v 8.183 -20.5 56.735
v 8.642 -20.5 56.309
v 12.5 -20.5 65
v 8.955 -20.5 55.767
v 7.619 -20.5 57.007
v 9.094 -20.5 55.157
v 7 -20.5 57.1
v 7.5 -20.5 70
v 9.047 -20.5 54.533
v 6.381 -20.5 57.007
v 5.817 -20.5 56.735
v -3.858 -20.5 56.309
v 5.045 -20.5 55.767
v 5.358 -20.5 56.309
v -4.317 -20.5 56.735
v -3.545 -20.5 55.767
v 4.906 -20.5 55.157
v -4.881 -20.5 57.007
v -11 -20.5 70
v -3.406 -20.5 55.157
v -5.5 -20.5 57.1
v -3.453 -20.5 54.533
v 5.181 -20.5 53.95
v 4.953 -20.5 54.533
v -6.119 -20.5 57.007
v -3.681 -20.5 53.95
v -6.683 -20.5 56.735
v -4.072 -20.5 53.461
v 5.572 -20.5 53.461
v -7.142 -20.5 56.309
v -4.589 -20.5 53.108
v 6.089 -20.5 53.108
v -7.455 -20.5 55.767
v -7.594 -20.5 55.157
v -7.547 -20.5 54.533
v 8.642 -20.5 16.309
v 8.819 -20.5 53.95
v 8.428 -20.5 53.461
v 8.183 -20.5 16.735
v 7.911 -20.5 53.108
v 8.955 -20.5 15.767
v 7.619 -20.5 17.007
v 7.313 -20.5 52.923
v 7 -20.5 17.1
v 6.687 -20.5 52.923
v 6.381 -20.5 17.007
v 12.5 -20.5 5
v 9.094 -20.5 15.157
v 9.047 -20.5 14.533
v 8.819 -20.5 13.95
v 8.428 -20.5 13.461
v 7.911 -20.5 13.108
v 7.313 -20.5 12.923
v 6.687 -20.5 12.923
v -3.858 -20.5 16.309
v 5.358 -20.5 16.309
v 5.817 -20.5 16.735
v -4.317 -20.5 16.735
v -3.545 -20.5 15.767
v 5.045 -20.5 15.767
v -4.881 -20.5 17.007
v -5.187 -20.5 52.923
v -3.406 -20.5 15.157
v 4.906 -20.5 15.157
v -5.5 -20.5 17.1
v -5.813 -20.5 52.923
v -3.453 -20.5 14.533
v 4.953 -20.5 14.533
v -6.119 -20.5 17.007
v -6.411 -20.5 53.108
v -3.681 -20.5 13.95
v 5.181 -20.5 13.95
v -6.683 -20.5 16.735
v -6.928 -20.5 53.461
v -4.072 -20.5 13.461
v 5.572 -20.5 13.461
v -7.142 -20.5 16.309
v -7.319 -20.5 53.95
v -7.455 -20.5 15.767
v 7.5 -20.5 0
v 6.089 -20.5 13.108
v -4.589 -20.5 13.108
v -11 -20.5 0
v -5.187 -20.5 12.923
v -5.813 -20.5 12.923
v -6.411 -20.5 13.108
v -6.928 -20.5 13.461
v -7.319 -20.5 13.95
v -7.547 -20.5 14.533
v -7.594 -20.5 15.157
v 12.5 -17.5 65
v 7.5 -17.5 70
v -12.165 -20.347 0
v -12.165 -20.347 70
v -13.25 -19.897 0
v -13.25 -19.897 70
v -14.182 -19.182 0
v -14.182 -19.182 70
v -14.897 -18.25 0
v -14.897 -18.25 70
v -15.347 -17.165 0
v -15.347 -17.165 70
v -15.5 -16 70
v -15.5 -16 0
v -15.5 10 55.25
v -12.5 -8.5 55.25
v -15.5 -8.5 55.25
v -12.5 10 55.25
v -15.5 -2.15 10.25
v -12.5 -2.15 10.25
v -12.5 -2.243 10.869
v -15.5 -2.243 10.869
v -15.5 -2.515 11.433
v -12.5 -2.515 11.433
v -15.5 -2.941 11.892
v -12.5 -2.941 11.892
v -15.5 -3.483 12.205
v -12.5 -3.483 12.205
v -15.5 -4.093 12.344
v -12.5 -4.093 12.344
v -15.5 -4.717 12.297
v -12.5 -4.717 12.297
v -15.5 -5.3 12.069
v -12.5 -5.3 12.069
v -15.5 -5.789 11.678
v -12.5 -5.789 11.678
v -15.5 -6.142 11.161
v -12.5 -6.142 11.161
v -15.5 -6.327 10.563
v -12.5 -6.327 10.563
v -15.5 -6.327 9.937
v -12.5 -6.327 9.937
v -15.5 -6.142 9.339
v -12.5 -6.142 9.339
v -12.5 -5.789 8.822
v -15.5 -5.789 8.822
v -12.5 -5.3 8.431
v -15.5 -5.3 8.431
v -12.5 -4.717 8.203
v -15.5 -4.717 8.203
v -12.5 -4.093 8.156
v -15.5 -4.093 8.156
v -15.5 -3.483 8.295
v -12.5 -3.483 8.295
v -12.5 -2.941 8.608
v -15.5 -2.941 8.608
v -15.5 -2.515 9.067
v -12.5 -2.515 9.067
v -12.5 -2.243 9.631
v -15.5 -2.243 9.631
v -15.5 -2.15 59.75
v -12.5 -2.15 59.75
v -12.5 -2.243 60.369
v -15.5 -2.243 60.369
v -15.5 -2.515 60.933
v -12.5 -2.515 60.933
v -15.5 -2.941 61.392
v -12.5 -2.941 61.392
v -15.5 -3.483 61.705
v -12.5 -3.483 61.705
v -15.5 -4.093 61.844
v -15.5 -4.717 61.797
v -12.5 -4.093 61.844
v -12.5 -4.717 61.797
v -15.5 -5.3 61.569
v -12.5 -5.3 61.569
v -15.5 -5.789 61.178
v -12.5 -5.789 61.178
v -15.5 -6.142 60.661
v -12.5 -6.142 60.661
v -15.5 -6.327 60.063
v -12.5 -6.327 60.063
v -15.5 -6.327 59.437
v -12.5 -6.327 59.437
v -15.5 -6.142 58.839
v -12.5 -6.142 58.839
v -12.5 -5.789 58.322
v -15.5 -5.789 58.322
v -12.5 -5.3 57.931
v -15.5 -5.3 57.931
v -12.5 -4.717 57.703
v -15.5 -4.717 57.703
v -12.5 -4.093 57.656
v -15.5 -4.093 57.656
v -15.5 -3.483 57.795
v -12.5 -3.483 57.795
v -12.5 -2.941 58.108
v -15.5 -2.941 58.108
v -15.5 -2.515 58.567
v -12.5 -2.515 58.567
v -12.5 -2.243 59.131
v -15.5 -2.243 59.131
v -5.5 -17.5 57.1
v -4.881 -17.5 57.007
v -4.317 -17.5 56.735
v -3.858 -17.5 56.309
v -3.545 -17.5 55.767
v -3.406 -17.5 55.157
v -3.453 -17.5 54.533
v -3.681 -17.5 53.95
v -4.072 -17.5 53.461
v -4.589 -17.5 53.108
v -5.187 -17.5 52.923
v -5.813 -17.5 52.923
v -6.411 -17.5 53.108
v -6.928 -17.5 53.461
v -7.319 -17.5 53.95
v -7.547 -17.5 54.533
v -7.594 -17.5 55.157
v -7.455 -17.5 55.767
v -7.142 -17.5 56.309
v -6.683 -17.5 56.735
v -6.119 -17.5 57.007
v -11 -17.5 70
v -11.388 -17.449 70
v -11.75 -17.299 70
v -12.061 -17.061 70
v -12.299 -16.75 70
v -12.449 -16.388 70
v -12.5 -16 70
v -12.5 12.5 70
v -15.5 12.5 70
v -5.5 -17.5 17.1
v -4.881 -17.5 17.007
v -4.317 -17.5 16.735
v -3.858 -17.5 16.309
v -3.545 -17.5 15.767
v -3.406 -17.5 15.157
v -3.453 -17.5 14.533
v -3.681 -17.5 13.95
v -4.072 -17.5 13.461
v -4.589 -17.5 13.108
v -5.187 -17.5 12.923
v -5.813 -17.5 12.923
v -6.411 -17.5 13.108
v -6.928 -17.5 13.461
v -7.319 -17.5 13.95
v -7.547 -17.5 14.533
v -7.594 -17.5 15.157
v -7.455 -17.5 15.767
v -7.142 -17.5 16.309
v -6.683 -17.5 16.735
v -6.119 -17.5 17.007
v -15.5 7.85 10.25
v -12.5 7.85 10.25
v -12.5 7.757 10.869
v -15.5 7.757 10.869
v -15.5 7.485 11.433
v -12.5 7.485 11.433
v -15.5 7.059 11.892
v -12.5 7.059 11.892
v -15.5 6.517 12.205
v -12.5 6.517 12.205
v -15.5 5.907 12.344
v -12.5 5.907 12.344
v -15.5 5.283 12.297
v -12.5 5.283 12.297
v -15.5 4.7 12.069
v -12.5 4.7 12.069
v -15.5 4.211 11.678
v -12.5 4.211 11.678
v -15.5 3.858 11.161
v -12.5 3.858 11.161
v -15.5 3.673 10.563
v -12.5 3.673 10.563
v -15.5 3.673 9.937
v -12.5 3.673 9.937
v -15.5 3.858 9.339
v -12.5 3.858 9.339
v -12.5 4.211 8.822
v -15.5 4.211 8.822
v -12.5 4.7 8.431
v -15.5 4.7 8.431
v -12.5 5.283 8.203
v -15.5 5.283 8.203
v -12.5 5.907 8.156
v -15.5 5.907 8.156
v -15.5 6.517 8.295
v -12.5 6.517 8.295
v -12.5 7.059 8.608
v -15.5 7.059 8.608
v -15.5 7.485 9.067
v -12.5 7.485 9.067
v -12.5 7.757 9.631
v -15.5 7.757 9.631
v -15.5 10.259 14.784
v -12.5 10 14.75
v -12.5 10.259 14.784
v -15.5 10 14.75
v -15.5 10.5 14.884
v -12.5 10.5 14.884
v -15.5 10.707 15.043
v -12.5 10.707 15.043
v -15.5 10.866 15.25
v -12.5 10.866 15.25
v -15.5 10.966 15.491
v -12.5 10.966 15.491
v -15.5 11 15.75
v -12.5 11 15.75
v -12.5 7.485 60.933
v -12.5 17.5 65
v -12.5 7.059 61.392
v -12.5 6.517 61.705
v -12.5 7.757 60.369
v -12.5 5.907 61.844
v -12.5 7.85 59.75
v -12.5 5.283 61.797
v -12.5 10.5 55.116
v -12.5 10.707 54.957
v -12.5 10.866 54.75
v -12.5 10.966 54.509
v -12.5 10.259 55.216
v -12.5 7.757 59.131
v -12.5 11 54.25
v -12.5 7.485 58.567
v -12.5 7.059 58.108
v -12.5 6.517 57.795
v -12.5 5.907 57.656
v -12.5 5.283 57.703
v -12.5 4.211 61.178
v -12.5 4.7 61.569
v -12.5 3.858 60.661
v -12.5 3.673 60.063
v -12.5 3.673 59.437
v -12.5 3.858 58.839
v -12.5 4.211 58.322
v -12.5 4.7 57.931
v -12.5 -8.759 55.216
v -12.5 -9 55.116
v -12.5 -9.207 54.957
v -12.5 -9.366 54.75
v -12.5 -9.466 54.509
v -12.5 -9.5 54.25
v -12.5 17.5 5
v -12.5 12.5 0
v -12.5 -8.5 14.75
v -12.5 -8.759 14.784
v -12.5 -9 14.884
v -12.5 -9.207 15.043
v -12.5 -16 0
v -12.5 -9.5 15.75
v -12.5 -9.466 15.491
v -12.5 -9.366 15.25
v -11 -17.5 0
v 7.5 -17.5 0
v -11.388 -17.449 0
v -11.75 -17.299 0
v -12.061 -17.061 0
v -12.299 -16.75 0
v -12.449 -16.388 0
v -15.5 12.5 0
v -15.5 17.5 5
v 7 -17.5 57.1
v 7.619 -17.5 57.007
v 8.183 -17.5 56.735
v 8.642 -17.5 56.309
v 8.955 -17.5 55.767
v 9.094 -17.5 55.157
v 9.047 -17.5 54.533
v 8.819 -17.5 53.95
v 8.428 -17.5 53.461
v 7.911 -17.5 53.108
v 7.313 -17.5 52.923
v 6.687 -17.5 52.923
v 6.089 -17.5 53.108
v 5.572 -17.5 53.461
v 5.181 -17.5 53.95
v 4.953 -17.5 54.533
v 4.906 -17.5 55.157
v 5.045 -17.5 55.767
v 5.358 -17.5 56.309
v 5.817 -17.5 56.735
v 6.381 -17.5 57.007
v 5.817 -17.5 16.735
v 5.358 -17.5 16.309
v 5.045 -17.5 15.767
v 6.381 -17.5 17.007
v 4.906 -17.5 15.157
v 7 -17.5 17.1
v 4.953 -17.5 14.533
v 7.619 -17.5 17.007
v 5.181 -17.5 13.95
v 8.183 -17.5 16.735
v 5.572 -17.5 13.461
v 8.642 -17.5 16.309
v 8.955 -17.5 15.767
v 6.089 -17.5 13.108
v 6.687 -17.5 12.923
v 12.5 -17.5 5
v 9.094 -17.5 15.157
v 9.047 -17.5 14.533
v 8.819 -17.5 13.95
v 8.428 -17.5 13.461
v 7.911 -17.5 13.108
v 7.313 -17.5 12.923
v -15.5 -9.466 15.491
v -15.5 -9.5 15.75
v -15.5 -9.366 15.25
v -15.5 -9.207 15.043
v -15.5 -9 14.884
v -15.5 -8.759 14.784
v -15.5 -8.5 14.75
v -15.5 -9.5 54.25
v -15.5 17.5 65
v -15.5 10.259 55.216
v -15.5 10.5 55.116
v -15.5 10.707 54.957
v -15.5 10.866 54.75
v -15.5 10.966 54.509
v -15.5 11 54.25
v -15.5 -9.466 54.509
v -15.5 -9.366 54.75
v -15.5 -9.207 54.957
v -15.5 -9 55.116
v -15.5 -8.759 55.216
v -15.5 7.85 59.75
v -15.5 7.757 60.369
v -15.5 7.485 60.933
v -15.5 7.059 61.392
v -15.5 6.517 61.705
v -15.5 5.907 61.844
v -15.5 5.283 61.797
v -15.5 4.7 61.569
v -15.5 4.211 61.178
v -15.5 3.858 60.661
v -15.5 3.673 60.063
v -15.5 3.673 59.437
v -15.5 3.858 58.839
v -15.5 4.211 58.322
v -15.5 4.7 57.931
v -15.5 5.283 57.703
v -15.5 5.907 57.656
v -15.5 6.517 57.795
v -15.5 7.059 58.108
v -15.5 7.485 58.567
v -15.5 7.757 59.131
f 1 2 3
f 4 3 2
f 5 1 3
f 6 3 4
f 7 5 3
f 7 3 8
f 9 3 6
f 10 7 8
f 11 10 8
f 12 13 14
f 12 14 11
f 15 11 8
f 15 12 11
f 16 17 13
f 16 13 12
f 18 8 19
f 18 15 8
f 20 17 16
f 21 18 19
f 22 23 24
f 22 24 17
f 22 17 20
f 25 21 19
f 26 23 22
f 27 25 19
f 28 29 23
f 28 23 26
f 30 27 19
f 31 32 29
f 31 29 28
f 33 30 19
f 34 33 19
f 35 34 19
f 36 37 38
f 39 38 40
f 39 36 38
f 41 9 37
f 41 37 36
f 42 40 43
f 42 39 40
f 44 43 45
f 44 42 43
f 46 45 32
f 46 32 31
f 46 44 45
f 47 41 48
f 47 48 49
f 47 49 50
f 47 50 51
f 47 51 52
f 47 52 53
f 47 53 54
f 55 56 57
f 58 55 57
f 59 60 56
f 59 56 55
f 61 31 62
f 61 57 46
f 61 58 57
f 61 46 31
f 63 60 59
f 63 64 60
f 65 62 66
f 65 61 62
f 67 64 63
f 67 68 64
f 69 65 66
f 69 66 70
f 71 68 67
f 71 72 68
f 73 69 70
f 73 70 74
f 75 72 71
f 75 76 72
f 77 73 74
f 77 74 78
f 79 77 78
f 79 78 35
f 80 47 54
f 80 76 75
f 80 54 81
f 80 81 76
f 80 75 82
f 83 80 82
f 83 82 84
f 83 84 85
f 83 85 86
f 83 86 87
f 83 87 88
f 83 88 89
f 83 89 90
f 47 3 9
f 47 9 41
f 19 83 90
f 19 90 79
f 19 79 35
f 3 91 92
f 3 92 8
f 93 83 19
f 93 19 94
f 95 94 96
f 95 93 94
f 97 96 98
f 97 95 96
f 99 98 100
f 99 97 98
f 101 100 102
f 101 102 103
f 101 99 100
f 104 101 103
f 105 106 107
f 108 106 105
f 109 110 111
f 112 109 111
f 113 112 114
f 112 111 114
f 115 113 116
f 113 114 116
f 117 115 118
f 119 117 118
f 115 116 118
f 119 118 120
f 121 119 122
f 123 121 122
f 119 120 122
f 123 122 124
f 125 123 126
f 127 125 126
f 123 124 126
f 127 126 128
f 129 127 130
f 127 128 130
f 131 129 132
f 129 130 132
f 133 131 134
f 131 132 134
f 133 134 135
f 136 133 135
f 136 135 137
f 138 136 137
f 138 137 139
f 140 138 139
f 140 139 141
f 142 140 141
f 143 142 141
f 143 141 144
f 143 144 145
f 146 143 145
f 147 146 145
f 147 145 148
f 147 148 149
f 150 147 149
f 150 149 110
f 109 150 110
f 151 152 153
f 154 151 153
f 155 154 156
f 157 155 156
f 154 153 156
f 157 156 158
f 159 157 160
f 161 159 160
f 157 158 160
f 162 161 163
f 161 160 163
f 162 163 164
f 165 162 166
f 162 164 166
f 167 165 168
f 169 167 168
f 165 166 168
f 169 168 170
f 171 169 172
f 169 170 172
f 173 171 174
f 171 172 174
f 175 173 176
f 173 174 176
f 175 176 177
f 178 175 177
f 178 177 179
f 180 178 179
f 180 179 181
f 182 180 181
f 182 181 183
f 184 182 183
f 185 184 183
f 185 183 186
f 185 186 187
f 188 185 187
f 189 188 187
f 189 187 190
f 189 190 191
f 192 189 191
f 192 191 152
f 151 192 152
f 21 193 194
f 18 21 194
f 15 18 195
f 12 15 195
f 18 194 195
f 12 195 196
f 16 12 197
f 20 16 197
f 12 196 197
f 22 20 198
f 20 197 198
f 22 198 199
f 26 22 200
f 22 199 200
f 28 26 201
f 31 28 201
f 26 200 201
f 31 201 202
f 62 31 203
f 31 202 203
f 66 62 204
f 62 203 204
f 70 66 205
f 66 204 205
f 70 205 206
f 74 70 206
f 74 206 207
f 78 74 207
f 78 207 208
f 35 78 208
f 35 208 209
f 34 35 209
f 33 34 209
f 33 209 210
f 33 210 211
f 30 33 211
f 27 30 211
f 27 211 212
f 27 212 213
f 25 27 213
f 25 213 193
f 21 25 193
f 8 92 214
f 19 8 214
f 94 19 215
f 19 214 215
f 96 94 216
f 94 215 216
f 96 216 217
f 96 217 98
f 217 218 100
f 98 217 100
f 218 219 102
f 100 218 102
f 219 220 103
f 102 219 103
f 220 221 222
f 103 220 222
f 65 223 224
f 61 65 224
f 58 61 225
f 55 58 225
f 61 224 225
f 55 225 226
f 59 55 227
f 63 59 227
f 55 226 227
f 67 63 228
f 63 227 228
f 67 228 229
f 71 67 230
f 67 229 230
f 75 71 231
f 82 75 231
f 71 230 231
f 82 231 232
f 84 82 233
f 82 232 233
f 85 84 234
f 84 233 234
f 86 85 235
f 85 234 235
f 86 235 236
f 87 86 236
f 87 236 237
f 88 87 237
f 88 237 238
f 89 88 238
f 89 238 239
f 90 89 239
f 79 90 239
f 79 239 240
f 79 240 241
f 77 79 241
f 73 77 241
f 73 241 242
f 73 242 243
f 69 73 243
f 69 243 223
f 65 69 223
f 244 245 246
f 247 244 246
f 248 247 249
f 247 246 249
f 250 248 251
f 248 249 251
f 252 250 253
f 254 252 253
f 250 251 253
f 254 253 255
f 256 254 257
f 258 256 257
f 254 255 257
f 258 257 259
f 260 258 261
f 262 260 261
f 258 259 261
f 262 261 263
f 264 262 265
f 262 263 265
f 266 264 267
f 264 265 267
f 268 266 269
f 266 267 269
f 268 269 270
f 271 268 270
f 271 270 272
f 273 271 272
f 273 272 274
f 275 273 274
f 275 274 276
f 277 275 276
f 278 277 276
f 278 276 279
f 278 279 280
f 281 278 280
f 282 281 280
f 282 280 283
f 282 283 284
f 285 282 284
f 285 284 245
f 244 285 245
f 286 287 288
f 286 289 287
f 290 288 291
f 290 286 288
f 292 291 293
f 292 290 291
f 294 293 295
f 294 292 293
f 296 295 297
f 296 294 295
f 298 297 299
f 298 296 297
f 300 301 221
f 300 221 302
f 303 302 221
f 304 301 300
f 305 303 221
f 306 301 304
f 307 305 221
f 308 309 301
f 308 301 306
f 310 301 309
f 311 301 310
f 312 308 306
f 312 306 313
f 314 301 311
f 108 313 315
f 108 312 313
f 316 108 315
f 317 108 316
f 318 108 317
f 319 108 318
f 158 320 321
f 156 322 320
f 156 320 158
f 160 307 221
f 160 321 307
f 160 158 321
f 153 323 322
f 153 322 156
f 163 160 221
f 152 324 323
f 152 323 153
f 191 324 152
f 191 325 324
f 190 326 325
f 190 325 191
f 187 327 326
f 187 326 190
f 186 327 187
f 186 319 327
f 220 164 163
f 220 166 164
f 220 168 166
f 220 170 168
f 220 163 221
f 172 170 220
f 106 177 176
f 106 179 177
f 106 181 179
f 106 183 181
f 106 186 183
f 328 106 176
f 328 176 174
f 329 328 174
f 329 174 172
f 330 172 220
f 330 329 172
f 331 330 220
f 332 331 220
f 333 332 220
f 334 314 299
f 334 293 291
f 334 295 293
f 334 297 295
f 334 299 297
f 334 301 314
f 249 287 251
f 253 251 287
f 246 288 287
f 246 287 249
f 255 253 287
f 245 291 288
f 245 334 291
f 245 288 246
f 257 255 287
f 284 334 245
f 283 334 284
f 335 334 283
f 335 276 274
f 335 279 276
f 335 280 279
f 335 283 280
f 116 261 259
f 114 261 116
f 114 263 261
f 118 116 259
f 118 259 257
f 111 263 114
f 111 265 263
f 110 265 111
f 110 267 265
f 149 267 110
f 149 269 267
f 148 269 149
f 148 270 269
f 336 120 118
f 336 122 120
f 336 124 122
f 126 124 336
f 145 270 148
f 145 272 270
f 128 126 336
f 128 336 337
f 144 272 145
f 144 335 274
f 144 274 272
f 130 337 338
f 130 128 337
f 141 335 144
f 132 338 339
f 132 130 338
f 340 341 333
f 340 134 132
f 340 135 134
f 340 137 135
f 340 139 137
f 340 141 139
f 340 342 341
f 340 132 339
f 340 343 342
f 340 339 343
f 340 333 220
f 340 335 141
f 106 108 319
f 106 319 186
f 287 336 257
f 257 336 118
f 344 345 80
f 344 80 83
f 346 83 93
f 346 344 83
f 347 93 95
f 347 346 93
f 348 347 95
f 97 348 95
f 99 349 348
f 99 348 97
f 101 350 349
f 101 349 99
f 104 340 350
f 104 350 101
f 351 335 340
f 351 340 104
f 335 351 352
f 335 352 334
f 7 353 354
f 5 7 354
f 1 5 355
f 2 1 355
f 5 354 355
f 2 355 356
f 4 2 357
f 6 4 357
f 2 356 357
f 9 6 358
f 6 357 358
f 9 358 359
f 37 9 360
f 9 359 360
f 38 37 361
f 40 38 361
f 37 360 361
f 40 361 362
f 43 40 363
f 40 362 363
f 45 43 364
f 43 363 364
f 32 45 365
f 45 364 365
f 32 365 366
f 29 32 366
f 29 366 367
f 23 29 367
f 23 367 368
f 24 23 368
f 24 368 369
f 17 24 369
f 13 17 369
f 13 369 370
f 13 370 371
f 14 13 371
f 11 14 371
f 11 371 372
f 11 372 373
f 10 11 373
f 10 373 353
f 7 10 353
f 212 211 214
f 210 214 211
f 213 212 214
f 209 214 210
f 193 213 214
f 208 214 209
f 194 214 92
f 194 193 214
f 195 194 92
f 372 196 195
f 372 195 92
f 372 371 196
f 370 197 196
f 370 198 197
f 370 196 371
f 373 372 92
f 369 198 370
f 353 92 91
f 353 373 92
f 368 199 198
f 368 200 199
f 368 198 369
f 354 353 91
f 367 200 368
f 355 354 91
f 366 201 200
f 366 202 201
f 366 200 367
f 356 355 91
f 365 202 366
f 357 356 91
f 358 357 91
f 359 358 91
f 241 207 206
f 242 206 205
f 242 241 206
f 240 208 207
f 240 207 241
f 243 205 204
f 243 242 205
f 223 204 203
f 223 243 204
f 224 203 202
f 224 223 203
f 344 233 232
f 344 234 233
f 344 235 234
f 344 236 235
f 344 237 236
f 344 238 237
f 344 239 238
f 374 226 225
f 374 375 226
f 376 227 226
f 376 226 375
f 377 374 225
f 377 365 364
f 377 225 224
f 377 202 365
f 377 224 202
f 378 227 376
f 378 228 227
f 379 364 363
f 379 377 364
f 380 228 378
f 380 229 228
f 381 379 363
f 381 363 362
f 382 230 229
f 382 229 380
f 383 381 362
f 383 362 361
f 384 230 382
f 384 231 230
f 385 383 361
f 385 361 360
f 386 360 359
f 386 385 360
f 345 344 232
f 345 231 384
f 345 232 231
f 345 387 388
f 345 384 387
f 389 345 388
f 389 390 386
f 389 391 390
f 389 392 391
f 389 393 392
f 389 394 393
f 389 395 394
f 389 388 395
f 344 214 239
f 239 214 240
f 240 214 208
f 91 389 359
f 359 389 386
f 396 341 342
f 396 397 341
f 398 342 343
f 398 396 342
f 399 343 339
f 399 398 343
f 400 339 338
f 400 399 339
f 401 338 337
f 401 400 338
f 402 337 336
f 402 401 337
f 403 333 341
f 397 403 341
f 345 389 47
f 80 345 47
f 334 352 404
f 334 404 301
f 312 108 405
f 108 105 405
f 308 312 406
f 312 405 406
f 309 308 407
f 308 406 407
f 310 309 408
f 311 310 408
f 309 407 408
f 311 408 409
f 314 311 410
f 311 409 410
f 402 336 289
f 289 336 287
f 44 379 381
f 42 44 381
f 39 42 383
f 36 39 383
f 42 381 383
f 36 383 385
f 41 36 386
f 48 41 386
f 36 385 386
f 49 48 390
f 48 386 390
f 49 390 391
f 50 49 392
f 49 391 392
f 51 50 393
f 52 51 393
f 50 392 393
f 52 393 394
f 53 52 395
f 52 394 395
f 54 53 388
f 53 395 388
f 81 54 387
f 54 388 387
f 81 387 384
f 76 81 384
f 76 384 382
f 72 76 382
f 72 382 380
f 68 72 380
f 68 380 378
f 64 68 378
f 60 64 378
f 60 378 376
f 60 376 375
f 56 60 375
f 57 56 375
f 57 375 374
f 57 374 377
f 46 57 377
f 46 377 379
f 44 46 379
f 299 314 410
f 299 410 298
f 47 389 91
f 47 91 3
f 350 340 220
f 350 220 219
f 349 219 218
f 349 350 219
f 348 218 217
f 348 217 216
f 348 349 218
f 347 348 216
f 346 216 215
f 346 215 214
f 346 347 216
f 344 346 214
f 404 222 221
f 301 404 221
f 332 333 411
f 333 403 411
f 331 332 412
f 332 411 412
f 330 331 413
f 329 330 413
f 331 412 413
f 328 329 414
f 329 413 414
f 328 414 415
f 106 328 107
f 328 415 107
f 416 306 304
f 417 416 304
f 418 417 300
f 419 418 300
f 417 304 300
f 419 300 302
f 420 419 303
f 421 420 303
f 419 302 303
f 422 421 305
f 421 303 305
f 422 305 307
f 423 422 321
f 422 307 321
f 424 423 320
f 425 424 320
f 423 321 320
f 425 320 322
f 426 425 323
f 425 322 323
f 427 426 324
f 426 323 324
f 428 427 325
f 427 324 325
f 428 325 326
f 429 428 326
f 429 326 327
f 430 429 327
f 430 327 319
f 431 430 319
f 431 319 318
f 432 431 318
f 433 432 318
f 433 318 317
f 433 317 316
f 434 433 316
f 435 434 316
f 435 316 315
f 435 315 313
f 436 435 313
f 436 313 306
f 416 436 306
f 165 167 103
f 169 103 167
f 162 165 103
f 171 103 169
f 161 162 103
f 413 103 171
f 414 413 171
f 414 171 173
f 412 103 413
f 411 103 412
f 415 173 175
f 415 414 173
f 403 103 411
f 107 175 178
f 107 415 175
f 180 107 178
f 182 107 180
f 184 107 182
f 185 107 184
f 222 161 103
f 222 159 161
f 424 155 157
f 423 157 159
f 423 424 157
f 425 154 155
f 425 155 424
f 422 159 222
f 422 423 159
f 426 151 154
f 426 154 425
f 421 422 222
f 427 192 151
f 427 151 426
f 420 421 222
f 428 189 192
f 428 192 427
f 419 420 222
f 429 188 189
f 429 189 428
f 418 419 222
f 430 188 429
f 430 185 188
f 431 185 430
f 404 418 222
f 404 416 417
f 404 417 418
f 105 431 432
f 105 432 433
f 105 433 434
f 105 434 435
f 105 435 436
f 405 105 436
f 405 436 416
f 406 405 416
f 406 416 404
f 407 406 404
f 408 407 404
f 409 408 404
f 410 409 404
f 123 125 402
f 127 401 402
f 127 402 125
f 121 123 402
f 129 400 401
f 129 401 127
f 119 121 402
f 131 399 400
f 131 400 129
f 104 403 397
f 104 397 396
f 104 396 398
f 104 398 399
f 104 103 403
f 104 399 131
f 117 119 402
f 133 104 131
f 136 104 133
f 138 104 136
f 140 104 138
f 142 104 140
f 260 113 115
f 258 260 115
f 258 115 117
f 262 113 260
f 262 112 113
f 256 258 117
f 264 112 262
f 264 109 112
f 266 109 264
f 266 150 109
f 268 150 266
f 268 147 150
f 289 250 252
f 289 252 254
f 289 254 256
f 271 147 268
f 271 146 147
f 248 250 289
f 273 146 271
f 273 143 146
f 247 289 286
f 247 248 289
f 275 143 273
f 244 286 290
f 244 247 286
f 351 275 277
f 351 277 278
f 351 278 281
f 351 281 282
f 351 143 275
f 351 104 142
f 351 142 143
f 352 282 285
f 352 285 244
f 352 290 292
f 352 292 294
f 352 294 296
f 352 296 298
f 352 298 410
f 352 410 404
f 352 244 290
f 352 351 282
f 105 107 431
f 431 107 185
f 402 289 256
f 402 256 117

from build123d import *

# Parameters (mm, degrees)
SM_BASE_FLANGE_1_DEPTH = 70
CUT_EXTRUDE_7_REACH    = 79.105
SKETCH_18_W            = 40.5
SKETCH_18_H            = 20.5
CUT_EXTRUDE_8_REACH    = 79.105
SKETCH_19_R            = 2.1
FILLET_2_R             = 1
CUT_EXTRUDE_9_REACH    = 81.783
SKETCH_20_R            = 2.1
CHAMFER_3_SIZE         = 5


# Sheet-metal steps are written as plain solids
with BuildPart() as part:
    # Sketch 1 → 基材-凸緣1 (new body)
    with BuildSketch(Plane.XY):
        with BuildLine():
            Line((-12.5, 17.5), (-12.5, -16))
            ThreePointArc((-12.5, -16), (-12.060660172, -17.060660172), (-11, -17.5))
            Line((-11, -17.5), (12.5, -17.5))
            Line((12.5, -17.5), (12.5, -20.5))
            Line((12.5, -20.5), (-11, -20.5))
            ThreePointArc((-11, -20.5), (-14.181980515, -19.181980515), (-15.5, -16))
            Line((-15.5, -16), (-15.5, 17.5))
            Line((-15.5, 17.5), (-12.5, 17.5))
        make_face()
    extrude(amount=SM_BASE_FLANGE_1_DEPTH)

    # 草圖18 → 除料-伸長7 (cut, up to next)
    with BuildSketch(Plane(origin=(-12.5, 0, 0), x_dir=(0, 0, -1), z_dir=(1, 0, 0)), mode=Mode.PRIVATE) as cut_extrude_7_sk1:
        with Locations((-35, 0.75)):
            Rectangle(SKETCH_18_W, SKETCH_18_H)
    cut_extrude_7_tool1 = extrude(cut_extrude_7_sk1.sketch, amount=-CUT_EXTRUDE_7_REACH, mode=Mode.PRIVATE) & part.part
    add(cut_extrude_7_tool1.solids().sort_by_distance((-12.5, 0.75, 35))[0], mode=Mode.SUBTRACT)

    # 草圖19 → 除料-伸長8 (cut, up to next)
    with BuildSketch(Plane(origin=(-12.5, 0, 0), x_dir=(0, 0, -1), z_dir=(1, 0, 0)), mode=Mode.PRIVATE) as cut_extrude_8_sk1:
        with Locations(Location((-10.25, 5.75, 0), (0, 0, 90))):
            Circle(SKETCH_19_R)
    cut_extrude_8_tool1 = extrude(cut_extrude_8_sk1.sketch, amount=-CUT_EXTRUDE_8_REACH, mode=Mode.PRIVATE) & part.part
    # 草圖19 → 除料-伸長8 (cut, up to next)
    with BuildSketch(Plane(origin=(-12.5, 0, 0), x_dir=(0, 0, -1), z_dir=(1, 0, 0)), mode=Mode.PRIVATE) as cut_extrude_8_sk2:
        with Locations(Location((-10.25, -4.25, 0), (0, 0, 90))):
            Circle(SKETCH_19_R)
    cut_extrude_8_tool2 = extrude(cut_extrude_8_sk2.sketch, amount=-CUT_EXTRUDE_8_REACH, mode=Mode.PRIVATE) & part.part
    # 草圖19 → 除料-伸長8 (cut, up to next)
    with BuildSketch(Plane(origin=(-12.5, 0, 0), x_dir=(0, 0, -1), z_dir=(1, 0, 0)), mode=Mode.PRIVATE) as cut_extrude_8_sk3:
        with Locations(Location((-59.75, -4.25, 0), (0, 0, 90))):
            Circle(SKETCH_19_R)
    cut_extrude_8_tool3 = extrude(cut_extrude_8_sk3.sketch, amount=-CUT_EXTRUDE_8_REACH, mode=Mode.PRIVATE) & part.part
    # 草圖19 → 除料-伸長8 (cut, up to next)
    with BuildSketch(Plane(origin=(-12.5, 0, 0), x_dir=(0, 0, -1), z_dir=(1, 0, 0)), mode=Mode.PRIVATE) as cut_extrude_8_sk4:
        with Locations(Location((-59.75, 5.75, 0), (0, 0, 90))):
            Circle(SKETCH_19_R)
    cut_extrude_8_tool4 = extrude(cut_extrude_8_sk4.sketch, amount=-CUT_EXTRUDE_8_REACH, mode=Mode.PRIVATE) & part.part
    add(cut_extrude_8_tool1.solids().sort_by_distance((-12.5, 5.75, 10.25))[0], mode=Mode.SUBTRACT)
    add(cut_extrude_8_tool2.solids().sort_by_distance((-12.5, -4.25, 10.25))[0], mode=Mode.SUBTRACT)
    add(cut_extrude_8_tool3.solids().sort_by_distance((-12.5, -4.25, 59.75))[0], mode=Mode.SUBTRACT)
    add(cut_extrude_8_tool4.solids().sort_by_distance((-12.5, 5.75, 59.75))[0], mode=Mode.SUBTRACT)

    # 圓角2
    fillet_2_edges = [part.edges().sort_by_distance(p)[0] for p in [
        (-14, 11, 14.75),
        (-14, -9.5, 14.75),
        (-14, -9.5, 55.25),
        (-14, 11, 55.25),
    ]]
    fillet(fillet_2_edges, radius=FILLET_2_R)

    # 草圖20 → 除料-伸長9 (cut, up to next)
    with BuildSketch(Plane(origin=(0, -17.5, 0), x_dir=(1, 0, 0), z_dir=(0, 1, 0)), mode=Mode.PRIVATE) as cut_extrude_9_sk1:
        with Locations(Location((-5.5, -15, 0), (0, 0, 270))):
            Circle(SKETCH_20_R)
    cut_extrude_9_tool1 = extrude(cut_extrude_9_sk1.sketch, amount=-CUT_EXTRUDE_9_REACH, mode=Mode.PRIVATE) & part.part
    # 草圖20 → 除料-伸長9 (cut, up to next)
    with BuildSketch(Plane(origin=(0, -17.5, 0), x_dir=(1, 0, 0), z_dir=(0, 1, 0)), mode=Mode.PRIVATE) as cut_extrude_9_sk2:
        with Locations(Location((7, -15, 0), (0, 0, 270))):
            Circle(SKETCH_20_R)
    cut_extrude_9_tool2 = extrude(cut_extrude_9_sk2.sketch, amount=-CUT_EXTRUDE_9_REACH, mode=Mode.PRIVATE) & part.part
    # 草圖20 → 除料-伸長9 (cut, up to next)
    with BuildSketch(Plane(origin=(0, -17.5, 0), x_dir=(1, 0, 0), z_dir=(0, 1, 0)), mode=Mode.PRIVATE) as cut_extrude_9_sk3:
        with Locations(Location((7, -55, 0), (0, 0, 270))):
            Circle(SKETCH_20_R)
    cut_extrude_9_tool3 = extrude(cut_extrude_9_sk3.sketch, amount=-CUT_EXTRUDE_9_REACH, mode=Mode.PRIVATE) & part.part
    # 草圖20 → 除料-伸長9 (cut, up to next)
    with BuildSketch(Plane(origin=(0, -17.5, 0), x_dir=(1, 0, 0), z_dir=(0, 1, 0)), mode=Mode.PRIVATE) as cut_extrude_9_sk4:
        with Locations(Location((-5.5, -55, 0), (0, 0, 270))):
            Circle(SKETCH_20_R)
    cut_extrude_9_tool4 = extrude(cut_extrude_9_sk4.sketch, amount=-CUT_EXTRUDE_9_REACH, mode=Mode.PRIVATE) & part.part
    add(cut_extrude_9_tool1.solids().sort_by_distance((-5.5, -17.5, 15))[0], mode=Mode.SUBTRACT)
    add(cut_extrude_9_tool2.solids().sort_by_distance((7, -17.5, 15))[0], mode=Mode.SUBTRACT)
    add(cut_extrude_9_tool3.solids().sort_by_distance((7, -17.5, 55))[0], mode=Mode.SUBTRACT)
    add(cut_extrude_9_tool4.solids().sort_by_distance((-5.5, -17.5, 55))[0], mode=Mode.SUBTRACT)

    # 導角3
    chamfer_3_edges = [part.edges().sort_by_distance(p)[0] for p in [
        (-14, 17.5, 70),
        (-14, 17.5, 0),
        (12.5, -19, 70),
        (12.5, -19, 0),
    ]]
    chamfer(chamfer_3_edges, length=CHAMFER_3_SIZE)


solid = part.part
